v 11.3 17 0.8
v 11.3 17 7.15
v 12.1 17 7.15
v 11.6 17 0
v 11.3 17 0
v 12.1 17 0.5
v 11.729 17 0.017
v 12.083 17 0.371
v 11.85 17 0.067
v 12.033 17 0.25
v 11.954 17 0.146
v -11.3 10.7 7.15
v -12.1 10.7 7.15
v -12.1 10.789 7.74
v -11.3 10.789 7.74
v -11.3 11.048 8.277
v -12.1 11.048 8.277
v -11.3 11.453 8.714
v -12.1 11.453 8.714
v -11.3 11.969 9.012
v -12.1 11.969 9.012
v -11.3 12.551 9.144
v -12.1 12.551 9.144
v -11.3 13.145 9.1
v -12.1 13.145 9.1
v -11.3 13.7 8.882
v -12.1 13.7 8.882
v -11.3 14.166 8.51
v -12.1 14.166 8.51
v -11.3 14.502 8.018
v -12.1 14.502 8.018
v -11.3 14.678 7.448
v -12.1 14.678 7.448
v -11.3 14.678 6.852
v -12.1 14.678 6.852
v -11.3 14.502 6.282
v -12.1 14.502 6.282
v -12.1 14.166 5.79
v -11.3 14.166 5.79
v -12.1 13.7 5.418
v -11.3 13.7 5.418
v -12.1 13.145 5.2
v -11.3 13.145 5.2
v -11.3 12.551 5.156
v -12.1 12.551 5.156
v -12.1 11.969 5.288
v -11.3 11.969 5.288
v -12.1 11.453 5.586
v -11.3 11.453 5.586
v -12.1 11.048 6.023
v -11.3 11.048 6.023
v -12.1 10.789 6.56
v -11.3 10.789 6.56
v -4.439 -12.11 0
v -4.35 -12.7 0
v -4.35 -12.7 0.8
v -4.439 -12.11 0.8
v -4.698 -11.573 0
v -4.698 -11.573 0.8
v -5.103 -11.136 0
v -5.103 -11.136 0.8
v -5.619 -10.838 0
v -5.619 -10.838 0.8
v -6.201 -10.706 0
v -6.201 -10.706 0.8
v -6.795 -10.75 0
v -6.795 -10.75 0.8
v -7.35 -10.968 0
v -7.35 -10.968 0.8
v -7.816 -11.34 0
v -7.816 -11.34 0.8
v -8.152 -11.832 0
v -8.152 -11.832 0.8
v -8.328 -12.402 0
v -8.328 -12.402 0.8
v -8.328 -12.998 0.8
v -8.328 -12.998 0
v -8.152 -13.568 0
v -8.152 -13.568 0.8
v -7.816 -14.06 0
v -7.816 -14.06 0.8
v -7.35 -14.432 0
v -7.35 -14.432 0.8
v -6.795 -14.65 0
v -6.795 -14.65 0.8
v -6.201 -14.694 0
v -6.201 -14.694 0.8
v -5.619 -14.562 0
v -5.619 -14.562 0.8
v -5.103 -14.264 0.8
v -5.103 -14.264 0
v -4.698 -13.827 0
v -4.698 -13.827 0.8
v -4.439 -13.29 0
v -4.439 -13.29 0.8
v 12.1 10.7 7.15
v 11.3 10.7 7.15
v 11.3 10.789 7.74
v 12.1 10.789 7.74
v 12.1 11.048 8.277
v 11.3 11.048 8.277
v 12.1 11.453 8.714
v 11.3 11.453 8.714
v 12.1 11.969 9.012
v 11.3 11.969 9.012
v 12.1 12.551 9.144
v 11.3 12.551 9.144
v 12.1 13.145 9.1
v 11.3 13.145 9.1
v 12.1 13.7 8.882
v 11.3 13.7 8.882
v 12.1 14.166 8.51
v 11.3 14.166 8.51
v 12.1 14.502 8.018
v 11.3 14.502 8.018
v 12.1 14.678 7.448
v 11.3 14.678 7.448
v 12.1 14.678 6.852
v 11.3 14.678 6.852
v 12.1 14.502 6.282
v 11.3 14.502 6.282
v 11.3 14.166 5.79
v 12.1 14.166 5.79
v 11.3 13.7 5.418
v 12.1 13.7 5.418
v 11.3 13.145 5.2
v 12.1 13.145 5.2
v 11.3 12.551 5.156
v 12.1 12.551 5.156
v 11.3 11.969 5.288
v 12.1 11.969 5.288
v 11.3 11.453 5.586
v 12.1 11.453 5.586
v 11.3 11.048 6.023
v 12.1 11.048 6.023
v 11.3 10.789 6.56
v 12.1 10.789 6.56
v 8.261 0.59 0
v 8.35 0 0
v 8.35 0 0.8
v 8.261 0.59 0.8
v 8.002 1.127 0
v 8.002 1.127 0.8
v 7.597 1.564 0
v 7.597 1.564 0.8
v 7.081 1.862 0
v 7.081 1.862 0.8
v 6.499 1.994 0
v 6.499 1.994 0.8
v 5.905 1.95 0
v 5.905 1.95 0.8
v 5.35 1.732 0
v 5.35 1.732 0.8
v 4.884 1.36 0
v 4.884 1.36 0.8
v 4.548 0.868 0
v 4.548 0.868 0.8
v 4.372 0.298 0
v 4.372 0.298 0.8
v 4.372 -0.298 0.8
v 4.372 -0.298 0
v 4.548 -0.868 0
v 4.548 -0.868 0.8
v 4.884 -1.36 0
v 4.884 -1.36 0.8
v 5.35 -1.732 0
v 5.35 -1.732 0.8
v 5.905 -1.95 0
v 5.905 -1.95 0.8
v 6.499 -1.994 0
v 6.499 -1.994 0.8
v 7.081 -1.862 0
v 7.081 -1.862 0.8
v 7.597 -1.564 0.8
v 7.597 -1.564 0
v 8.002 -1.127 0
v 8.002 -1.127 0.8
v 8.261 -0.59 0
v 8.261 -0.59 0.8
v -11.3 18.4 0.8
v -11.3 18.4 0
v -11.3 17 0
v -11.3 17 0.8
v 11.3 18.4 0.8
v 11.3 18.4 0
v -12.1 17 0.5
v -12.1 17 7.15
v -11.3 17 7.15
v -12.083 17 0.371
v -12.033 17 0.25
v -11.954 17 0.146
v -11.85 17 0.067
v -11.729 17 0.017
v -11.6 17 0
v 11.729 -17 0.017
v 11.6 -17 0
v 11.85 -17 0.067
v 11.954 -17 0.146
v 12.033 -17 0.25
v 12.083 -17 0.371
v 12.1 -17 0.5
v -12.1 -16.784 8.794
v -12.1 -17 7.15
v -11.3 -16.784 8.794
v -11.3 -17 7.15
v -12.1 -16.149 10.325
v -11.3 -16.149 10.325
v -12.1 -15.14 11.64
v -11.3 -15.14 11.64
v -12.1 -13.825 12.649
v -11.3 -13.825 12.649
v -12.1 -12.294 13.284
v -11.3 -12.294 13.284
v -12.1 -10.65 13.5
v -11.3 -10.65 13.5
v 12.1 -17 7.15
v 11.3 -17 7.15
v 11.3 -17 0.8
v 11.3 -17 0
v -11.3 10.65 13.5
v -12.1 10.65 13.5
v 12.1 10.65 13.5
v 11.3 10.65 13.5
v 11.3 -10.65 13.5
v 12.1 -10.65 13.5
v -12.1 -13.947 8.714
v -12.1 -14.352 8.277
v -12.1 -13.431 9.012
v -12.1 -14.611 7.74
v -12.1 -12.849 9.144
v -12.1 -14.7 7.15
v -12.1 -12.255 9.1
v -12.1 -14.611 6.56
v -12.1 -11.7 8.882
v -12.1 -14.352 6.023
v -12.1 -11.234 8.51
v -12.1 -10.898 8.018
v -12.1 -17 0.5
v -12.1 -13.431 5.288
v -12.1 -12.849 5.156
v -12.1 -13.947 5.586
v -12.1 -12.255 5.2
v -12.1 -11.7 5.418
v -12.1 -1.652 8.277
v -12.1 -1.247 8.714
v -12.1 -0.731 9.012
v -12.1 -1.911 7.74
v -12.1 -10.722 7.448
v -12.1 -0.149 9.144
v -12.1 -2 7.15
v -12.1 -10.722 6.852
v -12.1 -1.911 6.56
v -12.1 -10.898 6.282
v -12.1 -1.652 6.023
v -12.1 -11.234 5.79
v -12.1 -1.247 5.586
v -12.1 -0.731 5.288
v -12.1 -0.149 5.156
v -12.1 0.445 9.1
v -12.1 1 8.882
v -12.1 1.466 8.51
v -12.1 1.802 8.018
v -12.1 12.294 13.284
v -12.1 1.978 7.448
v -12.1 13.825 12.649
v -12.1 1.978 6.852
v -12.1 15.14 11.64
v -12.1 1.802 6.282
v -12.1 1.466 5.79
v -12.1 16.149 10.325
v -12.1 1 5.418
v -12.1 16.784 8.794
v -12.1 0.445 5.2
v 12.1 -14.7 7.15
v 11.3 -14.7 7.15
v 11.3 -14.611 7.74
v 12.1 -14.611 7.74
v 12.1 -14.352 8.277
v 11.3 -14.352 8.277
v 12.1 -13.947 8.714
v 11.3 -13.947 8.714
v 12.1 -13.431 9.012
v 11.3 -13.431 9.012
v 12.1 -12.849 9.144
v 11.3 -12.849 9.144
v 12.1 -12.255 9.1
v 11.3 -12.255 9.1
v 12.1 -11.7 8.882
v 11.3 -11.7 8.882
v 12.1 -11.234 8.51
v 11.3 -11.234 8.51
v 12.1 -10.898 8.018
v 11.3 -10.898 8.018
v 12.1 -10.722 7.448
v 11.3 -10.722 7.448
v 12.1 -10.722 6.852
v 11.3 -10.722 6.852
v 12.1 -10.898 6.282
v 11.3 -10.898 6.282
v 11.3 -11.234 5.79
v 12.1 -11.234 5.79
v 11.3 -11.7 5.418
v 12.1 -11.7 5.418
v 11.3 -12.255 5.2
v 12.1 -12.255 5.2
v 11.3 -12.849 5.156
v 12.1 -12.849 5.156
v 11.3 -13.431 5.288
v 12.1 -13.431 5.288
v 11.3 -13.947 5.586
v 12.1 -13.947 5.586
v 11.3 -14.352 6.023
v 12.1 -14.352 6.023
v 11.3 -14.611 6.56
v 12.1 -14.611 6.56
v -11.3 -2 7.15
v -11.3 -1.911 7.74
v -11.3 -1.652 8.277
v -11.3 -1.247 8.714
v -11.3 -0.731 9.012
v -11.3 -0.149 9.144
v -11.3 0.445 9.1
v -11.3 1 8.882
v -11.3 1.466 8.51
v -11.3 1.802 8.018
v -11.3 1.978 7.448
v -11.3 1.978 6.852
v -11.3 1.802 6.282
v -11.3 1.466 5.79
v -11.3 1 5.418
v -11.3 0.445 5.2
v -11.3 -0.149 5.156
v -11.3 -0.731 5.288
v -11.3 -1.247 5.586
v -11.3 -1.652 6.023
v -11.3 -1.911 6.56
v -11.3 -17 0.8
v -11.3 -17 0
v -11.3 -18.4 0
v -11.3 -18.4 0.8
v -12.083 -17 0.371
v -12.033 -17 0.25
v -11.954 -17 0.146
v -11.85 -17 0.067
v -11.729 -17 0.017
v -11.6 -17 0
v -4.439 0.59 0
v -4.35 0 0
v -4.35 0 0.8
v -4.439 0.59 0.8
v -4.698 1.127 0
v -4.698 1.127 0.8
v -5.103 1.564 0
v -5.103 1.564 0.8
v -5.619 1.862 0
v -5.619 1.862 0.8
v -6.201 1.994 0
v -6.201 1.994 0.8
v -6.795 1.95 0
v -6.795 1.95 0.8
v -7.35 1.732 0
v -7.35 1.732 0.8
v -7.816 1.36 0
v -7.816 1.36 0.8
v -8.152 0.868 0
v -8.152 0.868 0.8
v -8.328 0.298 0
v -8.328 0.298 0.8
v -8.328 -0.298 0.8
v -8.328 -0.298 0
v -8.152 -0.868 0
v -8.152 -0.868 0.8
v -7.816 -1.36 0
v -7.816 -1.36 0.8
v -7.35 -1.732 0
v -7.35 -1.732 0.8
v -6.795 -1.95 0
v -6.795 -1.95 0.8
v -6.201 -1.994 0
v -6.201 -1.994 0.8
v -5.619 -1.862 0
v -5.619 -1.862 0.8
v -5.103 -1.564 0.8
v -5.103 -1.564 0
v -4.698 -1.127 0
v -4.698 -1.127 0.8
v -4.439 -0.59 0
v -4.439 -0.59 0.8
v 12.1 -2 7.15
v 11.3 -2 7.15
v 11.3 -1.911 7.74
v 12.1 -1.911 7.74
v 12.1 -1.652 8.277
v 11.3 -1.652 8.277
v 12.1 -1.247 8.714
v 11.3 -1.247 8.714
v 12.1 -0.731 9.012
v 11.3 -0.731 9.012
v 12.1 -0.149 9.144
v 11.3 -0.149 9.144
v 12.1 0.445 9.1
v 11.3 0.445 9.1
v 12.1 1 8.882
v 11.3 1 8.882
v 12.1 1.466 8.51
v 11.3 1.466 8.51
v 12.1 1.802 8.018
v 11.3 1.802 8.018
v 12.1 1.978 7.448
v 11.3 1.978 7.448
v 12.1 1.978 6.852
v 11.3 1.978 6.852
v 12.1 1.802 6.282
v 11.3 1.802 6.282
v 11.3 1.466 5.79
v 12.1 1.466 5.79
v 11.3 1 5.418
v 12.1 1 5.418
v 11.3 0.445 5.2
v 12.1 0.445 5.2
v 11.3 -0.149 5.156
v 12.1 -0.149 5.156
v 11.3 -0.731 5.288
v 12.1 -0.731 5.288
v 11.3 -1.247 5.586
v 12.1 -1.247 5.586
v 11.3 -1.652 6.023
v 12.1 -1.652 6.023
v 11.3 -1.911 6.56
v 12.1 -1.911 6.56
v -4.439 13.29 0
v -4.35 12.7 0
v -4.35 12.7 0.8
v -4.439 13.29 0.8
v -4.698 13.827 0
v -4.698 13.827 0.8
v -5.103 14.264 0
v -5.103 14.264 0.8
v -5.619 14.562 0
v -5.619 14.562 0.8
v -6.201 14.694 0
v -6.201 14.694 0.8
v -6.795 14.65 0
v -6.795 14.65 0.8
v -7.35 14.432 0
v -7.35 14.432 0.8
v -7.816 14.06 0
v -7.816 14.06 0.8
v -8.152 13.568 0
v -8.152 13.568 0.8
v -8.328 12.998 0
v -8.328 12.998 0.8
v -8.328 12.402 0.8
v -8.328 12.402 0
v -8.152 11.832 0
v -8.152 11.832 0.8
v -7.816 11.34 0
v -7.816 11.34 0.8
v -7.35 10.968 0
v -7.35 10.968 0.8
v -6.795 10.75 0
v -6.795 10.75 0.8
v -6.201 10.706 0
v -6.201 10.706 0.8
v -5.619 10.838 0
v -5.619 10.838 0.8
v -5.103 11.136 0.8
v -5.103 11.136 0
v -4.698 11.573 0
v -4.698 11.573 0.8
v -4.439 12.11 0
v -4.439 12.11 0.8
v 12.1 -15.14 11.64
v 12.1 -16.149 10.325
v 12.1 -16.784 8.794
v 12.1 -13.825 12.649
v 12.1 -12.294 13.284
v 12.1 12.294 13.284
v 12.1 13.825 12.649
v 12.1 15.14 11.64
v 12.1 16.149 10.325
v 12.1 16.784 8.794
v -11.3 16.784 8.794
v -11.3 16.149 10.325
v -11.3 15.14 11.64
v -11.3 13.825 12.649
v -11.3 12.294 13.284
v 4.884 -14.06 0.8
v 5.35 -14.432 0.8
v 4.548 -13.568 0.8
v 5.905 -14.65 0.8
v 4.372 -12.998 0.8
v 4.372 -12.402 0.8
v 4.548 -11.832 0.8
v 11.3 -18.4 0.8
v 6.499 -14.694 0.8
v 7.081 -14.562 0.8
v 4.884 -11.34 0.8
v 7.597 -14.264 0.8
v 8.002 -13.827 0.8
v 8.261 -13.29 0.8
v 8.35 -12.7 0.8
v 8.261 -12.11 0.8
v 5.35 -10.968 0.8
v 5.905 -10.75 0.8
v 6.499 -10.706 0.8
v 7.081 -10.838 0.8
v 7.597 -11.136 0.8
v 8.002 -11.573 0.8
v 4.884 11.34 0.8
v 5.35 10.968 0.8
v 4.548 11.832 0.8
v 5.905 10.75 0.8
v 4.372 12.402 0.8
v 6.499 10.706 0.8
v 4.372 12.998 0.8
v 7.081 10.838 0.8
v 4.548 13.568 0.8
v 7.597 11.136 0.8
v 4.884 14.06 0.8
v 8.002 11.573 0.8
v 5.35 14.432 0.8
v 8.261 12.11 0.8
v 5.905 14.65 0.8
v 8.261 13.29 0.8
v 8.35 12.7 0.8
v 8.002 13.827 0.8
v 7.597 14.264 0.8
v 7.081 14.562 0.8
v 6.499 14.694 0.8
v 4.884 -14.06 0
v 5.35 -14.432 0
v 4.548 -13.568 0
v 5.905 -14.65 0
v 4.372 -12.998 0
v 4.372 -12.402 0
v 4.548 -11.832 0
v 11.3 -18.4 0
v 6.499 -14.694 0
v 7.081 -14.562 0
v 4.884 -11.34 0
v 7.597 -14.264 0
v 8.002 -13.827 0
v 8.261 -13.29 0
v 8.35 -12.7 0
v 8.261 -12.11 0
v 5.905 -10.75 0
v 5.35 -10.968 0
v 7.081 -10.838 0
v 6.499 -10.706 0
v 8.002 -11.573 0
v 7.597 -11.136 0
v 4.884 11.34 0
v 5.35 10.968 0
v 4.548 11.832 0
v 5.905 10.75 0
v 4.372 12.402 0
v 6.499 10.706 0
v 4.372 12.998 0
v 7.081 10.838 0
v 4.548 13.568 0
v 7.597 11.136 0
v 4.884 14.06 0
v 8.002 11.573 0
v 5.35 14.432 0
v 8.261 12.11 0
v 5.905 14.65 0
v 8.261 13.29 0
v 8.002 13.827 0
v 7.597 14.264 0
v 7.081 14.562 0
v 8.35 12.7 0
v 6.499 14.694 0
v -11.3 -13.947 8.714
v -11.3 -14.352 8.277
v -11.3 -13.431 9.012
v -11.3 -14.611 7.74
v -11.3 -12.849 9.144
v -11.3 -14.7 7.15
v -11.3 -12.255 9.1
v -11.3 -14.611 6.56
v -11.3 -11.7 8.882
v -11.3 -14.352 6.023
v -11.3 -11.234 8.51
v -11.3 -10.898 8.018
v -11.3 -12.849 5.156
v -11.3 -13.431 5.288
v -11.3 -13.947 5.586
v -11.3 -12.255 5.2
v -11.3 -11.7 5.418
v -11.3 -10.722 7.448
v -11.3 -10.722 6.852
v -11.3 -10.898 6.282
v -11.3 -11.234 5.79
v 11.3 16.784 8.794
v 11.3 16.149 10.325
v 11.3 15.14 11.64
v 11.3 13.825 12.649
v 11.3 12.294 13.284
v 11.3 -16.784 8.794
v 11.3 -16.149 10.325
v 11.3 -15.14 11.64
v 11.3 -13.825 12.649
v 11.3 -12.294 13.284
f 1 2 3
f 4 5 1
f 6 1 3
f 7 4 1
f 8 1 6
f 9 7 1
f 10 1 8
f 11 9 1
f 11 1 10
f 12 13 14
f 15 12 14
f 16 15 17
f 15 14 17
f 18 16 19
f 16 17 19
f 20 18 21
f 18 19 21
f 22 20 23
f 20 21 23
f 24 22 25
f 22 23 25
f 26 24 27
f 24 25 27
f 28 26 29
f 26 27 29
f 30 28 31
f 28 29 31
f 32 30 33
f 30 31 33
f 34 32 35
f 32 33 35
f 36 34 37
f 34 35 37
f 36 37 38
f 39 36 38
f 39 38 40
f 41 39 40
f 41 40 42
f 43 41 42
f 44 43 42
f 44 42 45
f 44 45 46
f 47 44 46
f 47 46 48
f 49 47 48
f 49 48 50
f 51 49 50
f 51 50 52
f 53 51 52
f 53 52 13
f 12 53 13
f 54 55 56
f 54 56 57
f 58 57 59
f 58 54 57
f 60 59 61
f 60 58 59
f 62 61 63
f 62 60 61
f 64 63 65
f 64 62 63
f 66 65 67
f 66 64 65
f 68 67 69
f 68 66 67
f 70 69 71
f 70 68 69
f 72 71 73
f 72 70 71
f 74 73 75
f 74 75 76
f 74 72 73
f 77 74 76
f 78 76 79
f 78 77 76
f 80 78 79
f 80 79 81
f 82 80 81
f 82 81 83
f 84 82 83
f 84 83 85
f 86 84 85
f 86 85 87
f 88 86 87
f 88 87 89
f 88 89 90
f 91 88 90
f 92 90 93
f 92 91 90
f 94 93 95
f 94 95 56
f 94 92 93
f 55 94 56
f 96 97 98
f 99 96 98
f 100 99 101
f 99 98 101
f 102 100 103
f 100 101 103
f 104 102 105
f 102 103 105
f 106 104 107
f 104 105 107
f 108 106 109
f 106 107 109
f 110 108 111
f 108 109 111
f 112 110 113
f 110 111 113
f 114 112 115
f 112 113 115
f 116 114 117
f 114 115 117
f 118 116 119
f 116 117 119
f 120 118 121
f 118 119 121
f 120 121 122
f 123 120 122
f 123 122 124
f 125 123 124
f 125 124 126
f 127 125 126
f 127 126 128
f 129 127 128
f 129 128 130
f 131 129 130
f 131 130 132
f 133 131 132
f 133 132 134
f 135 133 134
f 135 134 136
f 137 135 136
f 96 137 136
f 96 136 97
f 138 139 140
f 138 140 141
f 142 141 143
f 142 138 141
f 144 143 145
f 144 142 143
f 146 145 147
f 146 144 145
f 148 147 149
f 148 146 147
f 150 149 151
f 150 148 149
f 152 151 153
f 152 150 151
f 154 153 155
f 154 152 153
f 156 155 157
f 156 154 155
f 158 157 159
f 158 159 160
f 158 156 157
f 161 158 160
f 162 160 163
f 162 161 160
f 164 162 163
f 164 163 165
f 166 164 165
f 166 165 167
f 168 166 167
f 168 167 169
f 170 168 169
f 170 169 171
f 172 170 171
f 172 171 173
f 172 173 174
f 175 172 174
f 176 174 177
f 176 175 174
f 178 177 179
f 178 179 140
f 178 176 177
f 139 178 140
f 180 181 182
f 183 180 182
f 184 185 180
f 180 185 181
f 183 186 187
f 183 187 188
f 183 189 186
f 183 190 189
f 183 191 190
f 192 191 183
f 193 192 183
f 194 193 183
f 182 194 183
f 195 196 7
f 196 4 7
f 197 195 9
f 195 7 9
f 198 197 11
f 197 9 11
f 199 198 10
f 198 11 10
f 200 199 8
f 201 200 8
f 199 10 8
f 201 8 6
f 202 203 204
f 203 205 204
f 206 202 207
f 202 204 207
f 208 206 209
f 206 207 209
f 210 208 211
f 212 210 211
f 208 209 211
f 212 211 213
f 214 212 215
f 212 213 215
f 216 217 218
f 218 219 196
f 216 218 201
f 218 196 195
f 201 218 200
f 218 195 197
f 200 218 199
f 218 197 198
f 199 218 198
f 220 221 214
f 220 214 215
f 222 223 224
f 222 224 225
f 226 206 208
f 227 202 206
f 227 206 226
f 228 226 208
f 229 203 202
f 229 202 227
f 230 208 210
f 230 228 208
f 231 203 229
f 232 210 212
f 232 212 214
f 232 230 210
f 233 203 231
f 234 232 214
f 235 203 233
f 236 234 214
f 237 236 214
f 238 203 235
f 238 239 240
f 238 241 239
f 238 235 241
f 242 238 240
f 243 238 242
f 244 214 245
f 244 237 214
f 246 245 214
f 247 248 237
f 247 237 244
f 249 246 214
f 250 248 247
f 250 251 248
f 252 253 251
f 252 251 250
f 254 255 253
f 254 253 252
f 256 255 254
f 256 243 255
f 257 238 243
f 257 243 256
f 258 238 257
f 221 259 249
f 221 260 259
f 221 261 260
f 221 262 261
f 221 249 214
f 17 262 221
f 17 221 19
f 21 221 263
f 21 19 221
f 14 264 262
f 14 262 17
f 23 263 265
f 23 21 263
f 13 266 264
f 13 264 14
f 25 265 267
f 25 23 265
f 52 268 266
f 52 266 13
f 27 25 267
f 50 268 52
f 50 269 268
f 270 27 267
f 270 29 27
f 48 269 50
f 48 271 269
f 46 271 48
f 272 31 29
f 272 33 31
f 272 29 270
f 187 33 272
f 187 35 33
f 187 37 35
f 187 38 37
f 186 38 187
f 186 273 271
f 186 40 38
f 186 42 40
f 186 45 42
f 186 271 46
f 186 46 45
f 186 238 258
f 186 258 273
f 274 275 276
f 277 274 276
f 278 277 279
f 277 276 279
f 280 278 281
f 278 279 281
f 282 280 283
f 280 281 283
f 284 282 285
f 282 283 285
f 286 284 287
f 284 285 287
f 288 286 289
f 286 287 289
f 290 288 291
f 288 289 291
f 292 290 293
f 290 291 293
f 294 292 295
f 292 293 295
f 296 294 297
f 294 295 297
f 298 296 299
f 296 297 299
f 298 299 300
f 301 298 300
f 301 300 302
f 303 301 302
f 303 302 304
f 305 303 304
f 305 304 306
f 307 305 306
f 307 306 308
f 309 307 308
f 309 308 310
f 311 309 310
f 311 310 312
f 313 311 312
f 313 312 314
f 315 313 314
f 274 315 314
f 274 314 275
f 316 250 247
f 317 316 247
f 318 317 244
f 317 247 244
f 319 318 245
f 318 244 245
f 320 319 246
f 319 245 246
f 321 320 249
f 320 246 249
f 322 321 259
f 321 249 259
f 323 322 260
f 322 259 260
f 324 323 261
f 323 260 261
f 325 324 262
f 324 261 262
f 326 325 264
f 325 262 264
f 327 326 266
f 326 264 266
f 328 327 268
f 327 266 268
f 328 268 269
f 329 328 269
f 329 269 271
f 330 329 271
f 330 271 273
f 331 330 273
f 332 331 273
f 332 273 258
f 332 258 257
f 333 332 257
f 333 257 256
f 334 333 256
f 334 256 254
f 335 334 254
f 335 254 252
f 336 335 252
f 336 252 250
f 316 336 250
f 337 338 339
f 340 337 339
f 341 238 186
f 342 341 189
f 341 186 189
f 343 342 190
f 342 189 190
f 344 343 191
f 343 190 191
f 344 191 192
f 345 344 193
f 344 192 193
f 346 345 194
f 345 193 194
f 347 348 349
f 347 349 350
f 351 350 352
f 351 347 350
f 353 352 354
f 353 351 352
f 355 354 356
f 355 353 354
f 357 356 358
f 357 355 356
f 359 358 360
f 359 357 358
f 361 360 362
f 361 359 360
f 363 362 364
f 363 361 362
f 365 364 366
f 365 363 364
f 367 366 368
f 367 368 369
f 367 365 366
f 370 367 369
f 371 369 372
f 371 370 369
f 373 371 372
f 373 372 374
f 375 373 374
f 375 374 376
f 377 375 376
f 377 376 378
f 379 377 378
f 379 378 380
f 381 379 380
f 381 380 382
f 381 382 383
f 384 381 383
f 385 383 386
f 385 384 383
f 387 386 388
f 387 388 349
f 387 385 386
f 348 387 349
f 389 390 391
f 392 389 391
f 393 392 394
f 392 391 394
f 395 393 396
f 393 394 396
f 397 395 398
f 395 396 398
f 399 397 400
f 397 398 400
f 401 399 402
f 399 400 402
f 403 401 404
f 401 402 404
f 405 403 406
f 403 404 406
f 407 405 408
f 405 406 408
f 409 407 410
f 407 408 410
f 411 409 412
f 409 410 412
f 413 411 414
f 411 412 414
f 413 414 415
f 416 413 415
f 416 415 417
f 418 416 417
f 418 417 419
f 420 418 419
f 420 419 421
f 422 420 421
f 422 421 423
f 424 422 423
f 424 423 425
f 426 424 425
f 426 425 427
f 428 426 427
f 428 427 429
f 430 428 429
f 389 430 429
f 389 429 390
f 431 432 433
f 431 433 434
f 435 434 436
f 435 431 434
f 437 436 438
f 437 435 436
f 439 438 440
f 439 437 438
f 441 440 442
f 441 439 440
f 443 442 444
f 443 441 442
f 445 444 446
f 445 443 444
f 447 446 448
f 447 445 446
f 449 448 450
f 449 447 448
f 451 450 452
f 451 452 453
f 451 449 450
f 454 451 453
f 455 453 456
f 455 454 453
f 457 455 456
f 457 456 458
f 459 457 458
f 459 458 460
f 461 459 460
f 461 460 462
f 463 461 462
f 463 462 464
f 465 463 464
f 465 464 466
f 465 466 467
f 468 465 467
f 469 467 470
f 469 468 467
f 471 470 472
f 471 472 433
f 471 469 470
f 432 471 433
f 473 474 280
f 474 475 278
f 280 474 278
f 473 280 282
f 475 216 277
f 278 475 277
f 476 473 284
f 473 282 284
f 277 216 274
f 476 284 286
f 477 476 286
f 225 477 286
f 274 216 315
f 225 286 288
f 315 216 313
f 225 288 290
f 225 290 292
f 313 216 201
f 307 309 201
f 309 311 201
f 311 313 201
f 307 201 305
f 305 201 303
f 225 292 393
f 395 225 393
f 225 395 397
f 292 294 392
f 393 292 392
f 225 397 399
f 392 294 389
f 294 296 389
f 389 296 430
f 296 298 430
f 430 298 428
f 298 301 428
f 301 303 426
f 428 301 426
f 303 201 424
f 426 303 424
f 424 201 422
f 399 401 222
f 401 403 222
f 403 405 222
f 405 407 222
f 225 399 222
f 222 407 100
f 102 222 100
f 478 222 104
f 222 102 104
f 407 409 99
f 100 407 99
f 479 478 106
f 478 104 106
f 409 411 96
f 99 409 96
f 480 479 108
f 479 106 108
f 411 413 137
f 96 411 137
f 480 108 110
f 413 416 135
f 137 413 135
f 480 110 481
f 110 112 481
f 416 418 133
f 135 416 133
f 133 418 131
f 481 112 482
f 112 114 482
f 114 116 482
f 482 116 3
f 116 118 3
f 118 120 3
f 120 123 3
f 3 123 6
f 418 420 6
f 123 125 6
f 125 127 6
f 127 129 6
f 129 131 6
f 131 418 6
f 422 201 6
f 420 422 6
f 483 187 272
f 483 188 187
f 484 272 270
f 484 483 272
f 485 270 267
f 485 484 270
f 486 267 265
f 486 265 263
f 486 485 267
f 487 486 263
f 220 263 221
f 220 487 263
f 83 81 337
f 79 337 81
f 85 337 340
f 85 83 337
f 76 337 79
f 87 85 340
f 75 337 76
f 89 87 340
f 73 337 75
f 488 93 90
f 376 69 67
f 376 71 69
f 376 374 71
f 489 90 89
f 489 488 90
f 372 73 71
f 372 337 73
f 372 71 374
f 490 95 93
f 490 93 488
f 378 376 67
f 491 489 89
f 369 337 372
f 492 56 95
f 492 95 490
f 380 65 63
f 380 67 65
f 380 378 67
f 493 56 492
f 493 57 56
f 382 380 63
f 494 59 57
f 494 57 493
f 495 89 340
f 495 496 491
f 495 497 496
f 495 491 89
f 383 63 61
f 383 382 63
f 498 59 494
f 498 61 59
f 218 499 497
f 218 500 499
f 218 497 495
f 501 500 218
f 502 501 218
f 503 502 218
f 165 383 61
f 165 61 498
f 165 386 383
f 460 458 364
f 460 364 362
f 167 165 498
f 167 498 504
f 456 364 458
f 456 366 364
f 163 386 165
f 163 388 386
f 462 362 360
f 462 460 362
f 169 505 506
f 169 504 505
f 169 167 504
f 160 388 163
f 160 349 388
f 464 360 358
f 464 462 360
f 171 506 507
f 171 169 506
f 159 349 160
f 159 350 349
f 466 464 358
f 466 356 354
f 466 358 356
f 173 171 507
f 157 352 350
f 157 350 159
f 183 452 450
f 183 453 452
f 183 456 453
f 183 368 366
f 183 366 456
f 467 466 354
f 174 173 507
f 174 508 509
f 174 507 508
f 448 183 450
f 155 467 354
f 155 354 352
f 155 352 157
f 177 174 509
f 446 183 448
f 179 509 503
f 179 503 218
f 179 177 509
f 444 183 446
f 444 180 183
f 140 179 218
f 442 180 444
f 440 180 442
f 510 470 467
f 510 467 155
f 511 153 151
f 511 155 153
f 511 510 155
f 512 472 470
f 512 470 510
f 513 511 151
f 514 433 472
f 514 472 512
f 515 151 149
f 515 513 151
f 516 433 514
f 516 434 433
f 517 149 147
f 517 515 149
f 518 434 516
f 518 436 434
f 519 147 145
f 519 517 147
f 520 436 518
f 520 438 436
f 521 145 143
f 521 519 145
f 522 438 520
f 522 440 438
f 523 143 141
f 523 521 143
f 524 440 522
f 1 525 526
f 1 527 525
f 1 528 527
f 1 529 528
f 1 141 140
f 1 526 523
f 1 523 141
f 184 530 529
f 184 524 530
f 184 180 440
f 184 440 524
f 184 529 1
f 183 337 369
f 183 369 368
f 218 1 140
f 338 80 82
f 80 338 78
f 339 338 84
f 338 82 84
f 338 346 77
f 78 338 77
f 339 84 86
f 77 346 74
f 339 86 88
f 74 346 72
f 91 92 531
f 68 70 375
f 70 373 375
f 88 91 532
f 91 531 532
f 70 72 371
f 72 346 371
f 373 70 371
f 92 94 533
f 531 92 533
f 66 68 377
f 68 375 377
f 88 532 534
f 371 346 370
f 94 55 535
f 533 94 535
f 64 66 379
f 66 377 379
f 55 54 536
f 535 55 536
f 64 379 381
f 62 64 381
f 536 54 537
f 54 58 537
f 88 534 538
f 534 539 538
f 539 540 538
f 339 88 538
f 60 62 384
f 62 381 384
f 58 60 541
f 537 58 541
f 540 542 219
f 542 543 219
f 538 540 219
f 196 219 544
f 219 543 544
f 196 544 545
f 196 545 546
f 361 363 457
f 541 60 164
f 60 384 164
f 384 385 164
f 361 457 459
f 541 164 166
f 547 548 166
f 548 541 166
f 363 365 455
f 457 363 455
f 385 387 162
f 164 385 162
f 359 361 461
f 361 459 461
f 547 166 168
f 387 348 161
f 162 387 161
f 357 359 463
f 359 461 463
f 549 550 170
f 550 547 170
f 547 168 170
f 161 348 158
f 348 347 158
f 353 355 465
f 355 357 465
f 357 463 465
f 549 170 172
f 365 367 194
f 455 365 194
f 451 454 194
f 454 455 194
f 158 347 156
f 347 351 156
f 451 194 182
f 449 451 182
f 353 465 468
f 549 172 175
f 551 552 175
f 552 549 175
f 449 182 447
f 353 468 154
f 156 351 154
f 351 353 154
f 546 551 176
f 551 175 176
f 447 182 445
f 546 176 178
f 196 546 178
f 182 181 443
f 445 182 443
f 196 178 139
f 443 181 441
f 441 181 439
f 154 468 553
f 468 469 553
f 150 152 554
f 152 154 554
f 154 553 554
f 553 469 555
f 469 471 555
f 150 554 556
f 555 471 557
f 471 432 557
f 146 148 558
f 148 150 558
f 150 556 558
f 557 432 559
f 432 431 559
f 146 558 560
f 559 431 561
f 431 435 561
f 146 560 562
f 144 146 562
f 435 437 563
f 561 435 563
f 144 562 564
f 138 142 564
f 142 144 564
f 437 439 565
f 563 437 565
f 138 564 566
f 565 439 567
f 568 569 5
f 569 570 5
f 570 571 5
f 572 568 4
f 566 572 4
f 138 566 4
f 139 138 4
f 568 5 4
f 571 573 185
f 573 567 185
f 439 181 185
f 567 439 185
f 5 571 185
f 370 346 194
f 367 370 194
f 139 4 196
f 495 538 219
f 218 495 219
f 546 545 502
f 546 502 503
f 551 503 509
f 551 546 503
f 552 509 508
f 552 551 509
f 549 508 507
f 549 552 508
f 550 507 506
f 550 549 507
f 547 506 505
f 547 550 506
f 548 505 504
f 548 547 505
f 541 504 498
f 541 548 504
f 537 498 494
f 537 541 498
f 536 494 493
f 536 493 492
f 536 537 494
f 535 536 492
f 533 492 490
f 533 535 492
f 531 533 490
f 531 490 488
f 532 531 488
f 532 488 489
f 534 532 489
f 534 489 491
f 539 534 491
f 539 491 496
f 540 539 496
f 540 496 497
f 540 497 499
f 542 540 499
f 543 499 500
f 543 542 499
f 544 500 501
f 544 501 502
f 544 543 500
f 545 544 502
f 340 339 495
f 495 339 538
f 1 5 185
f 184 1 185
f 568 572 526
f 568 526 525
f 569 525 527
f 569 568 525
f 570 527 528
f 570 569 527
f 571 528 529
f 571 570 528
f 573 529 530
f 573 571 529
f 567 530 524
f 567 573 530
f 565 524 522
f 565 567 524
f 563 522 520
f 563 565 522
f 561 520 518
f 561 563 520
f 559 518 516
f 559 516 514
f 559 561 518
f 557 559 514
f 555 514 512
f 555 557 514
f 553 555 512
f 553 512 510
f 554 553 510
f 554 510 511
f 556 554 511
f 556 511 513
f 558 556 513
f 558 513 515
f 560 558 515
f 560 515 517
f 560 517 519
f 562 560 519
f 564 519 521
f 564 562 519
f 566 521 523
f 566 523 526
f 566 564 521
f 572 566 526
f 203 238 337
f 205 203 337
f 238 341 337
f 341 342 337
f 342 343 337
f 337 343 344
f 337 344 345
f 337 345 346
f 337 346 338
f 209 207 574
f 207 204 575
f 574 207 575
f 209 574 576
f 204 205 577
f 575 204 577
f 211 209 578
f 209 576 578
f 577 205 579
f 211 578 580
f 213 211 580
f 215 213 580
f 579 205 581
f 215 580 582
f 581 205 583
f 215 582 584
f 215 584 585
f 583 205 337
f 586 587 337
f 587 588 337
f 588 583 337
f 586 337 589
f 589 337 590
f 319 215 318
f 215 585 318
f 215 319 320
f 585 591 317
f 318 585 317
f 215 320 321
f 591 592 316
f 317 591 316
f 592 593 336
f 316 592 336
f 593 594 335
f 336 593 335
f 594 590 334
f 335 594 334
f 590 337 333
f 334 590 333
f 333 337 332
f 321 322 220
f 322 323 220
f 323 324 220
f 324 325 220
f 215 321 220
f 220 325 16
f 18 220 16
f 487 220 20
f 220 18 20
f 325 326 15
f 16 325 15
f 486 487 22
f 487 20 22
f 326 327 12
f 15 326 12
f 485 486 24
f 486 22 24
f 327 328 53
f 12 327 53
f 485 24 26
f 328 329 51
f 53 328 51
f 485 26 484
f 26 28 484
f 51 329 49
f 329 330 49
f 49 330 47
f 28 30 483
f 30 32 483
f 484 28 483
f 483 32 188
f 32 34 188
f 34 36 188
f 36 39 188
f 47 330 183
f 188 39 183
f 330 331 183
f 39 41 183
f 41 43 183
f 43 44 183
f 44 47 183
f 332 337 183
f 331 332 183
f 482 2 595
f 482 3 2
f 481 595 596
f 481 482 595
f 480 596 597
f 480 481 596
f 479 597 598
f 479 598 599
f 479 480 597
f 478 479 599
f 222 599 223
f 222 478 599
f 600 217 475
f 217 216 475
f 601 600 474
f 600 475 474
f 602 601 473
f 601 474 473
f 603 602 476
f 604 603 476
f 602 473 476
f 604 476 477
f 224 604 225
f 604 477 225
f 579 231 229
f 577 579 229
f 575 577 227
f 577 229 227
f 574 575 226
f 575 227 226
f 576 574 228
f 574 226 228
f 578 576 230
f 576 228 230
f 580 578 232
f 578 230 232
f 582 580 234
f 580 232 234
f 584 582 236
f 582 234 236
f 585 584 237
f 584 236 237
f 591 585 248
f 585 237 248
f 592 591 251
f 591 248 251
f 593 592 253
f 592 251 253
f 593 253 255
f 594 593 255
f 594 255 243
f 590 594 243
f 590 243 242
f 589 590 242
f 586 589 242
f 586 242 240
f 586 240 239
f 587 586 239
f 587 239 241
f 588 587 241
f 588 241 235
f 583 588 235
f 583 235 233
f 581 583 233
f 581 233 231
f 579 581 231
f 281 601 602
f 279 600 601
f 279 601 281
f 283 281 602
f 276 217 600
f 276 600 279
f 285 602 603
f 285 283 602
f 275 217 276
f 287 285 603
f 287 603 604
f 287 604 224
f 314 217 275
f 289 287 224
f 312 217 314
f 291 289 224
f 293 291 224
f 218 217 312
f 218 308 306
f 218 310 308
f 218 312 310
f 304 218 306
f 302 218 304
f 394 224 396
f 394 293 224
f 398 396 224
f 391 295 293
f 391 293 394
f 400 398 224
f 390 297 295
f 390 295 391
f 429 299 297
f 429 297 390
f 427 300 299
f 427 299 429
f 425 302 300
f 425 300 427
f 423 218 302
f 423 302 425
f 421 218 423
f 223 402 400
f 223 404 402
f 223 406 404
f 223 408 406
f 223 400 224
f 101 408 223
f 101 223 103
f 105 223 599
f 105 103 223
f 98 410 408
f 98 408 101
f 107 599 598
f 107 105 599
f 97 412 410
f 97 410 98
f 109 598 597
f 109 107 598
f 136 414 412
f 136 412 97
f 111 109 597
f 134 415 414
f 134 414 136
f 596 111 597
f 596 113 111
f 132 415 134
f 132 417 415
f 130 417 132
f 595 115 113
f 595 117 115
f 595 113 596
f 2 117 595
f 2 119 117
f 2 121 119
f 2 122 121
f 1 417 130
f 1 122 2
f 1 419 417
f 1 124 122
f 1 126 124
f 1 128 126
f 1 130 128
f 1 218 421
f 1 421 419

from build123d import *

# Parameters (mm, degrees)
F0_R     = 2
F0_W     = 0.8
F0_H     = 34
F1_DEPTH = 0.8
F2_W     = 0.8
F2_H     = 34
F3_DEPTH = 12.7
F5_R     = 6.35
F6_D     = 4
F7_R     = 0.5


with BuildPart() as f1:
    # F0 (on Top) → F1 (new body)
    with BuildSketch(Plane.XY):
        Polygon((11.3, 17), (11.3, 18.4), (-11.3, 18.4), (-11.3, 17), (-11.3, -17), (-11.3, -18.4), (11.3, -18.4), (11.3, -17), align=None)
        with Locations((-6.35, -12.7)):
            Circle(F0_R, mode=Mode.SUBTRACT)
        with Locations((6.35, -12.7)):
            Circle(F0_R, mode=Mode.SUBTRACT)
        with Locations((-6.35, 0)):
            Circle(F0_R, mode=Mode.SUBTRACT)
        with Locations((-6.35, 12.7)):
            Circle(F0_R, mode=Mode.SUBTRACT)
        with Locations((6.35, 0)):
            Circle(F0_R, mode=Mode.SUBTRACT)
        with Locations((6.35, 12.7)):
            Circle(F0_R, mode=Mode.SUBTRACT)
        with Locations((11.7, 0)):
            Rectangle(F0_W, F0_H)
        with Locations((-11.7, 0)):
            Rectangle(F0_W, F0_H)
    extrude(amount=F1_DEPTH)

    # F2 (on face) → F3 (join)
    with BuildSketch(Plane.XY.offset(0.8)):
        with Locations((-11.7, 0)):
            Rectangle(F2_W, F2_H)
        with Locations((11.7, 0)):
            Rectangle(F2_W, F2_H)
    extrude(amount=F3_DEPTH)

    # F5
    f5_edges = [f1.edges().sort_by_distance(p)[0] for p in [
        (11.7, 17, 13.5),
        (-11.7, 17, 13.5),
        (11.7, -17, 13.5),
        (-11.7, -17, 13.5),
    ]]
    fillet(f5_edges, radius=F5_R)

    # F6 (through all)
    with Locations(Plane.YZ.offset(12.1)):
        with Locations((-12.7, 7.15), (0, 7.15), (12.7, 7.15)):
            Hole(F6_D / 2)

    # F7
    f7_edges = [f1.edges().sort_by_distance(p)[0] for p in [
        (12.1, 0, 0),
        (-12.1, 0, 0),
    ]]
    fillet(f7_edges, radius=F7_R)


solid = f1.part
